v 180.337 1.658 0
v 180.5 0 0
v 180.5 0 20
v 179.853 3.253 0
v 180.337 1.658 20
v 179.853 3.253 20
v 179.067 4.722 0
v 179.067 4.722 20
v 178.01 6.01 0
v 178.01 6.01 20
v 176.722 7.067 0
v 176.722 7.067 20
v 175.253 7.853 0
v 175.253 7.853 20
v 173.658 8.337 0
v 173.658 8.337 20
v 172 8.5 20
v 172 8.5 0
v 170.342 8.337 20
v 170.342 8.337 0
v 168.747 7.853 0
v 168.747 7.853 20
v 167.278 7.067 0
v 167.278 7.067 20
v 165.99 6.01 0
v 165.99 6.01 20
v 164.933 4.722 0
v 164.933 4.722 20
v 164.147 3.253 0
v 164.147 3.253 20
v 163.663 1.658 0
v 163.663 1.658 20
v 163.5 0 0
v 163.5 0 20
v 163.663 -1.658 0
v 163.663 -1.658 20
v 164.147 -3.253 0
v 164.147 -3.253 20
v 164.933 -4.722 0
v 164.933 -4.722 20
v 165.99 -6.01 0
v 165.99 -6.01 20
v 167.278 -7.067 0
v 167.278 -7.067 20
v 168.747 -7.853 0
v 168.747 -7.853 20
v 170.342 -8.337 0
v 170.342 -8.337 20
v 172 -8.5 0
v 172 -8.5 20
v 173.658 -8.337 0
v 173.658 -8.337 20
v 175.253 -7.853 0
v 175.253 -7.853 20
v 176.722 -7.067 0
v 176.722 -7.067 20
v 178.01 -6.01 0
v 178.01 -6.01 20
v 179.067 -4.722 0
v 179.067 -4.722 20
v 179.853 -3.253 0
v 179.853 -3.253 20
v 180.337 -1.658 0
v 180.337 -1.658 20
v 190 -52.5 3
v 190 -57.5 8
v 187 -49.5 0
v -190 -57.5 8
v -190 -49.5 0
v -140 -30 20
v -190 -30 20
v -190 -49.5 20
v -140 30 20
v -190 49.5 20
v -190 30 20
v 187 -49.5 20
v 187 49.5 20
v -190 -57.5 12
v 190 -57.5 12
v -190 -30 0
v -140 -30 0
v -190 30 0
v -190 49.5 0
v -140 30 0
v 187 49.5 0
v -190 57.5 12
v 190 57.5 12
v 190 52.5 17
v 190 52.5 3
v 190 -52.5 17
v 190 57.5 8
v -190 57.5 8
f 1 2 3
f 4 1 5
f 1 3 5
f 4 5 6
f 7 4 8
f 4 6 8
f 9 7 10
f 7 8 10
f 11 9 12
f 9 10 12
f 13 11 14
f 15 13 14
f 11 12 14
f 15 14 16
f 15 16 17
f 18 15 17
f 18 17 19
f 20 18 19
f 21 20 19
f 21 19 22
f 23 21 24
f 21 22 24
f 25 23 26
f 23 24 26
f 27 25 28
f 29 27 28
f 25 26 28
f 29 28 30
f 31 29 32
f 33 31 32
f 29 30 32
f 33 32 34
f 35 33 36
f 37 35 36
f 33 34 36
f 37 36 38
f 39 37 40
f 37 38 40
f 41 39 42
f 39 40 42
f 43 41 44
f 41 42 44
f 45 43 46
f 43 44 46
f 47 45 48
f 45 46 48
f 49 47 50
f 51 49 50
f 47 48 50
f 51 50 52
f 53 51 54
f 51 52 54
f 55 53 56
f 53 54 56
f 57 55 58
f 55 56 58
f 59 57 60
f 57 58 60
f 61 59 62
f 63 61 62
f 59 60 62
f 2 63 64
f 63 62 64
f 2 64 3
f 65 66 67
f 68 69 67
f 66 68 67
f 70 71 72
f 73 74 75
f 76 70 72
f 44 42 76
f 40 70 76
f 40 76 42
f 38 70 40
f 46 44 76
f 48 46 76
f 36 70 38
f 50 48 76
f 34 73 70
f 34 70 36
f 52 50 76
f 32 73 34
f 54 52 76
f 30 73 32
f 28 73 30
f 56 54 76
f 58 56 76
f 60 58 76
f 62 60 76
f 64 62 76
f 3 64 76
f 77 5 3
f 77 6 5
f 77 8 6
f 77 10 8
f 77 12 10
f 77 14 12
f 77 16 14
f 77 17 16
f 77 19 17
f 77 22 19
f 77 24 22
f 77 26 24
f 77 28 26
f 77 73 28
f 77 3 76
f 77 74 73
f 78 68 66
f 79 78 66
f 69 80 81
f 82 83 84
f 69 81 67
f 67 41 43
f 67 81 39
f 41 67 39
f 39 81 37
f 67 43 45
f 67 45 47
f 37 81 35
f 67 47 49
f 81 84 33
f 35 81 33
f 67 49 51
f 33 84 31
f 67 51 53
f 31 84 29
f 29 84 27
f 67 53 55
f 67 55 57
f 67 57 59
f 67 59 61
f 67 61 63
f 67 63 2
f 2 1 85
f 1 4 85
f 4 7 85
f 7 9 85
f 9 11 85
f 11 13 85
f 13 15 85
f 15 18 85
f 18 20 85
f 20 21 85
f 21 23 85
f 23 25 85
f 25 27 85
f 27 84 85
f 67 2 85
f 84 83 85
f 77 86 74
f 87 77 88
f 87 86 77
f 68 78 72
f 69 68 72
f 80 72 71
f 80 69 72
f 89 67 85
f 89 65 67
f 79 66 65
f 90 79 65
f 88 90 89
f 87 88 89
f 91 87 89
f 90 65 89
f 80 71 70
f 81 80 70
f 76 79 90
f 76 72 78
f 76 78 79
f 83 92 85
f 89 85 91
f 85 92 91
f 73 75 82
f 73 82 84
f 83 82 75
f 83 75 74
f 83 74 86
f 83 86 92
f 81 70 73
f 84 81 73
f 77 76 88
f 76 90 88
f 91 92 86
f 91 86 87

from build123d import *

# Parameters (mm, degrees)
SKETCH_1_W          = 380
SKETCH_1_H          = 115
EXTRUDE_1_DEPTH     = 20
SKETCH_2_R          = 8.5
CUT_EXTRUDE_1_DEPTH = 20
CHAMFER_1_SIZE      = 3
SKETCH_3_W          = 50
SKETCH_3_H          = 60
CUT_EXTRUDE_2_DEPTH = 200.515037027
CHAMFER_2_SIZE      = 8


with BuildPart() as part:
    # 草图1 → 凸台-拉伸1 (new body)
    with BuildSketch(Plane.XY):
        Rectangle(SKETCH_1_W, SKETCH_1_H)
    extrude(amount=EXTRUDE_1_DEPTH)

    # 草图2 → 切除-拉伸1 (cut)
    with BuildSketch(Plane.XY.offset(20)):
        with Locations((172, 0)):
            Circle(SKETCH_2_R)
    extrude(amount=-CUT_EXTRUDE_1_DEPTH, mode=Mode.SUBTRACT)

    # 倒角1
    chamfer_1_edges = [part.edges().sort_by_distance(p)[0] for p in [
        (190, 0, 20),
        (190, 0, 0),
    ]]
    chamfer(chamfer_1_edges, length=CHAMFER_1_SIZE)

    # 草图3 → 切除-拉伸2 (cut, through all)
    with BuildSketch(Plane.XY.offset(20)):
        with Locations((-165, 0)):
            Rectangle(SKETCH_3_W, SKETCH_3_H)
    extrude(amount=-CUT_EXTRUDE_2_DEPTH, mode=Mode.SUBTRACT)

    # 倒角2
    chamfer_2_edges = [part.edges().sort_by_distance(p)[0] for p in [
        (-1.5, 57.5, 20),
        (-1.5, 57.5, 0),
        (-1.5, -57.5, 0),
        (-1.5, -57.5, 20),
    ]]
    chamfer(chamfer_2_edges, length=CHAMFER_2_SIZE)


solid = part.part
